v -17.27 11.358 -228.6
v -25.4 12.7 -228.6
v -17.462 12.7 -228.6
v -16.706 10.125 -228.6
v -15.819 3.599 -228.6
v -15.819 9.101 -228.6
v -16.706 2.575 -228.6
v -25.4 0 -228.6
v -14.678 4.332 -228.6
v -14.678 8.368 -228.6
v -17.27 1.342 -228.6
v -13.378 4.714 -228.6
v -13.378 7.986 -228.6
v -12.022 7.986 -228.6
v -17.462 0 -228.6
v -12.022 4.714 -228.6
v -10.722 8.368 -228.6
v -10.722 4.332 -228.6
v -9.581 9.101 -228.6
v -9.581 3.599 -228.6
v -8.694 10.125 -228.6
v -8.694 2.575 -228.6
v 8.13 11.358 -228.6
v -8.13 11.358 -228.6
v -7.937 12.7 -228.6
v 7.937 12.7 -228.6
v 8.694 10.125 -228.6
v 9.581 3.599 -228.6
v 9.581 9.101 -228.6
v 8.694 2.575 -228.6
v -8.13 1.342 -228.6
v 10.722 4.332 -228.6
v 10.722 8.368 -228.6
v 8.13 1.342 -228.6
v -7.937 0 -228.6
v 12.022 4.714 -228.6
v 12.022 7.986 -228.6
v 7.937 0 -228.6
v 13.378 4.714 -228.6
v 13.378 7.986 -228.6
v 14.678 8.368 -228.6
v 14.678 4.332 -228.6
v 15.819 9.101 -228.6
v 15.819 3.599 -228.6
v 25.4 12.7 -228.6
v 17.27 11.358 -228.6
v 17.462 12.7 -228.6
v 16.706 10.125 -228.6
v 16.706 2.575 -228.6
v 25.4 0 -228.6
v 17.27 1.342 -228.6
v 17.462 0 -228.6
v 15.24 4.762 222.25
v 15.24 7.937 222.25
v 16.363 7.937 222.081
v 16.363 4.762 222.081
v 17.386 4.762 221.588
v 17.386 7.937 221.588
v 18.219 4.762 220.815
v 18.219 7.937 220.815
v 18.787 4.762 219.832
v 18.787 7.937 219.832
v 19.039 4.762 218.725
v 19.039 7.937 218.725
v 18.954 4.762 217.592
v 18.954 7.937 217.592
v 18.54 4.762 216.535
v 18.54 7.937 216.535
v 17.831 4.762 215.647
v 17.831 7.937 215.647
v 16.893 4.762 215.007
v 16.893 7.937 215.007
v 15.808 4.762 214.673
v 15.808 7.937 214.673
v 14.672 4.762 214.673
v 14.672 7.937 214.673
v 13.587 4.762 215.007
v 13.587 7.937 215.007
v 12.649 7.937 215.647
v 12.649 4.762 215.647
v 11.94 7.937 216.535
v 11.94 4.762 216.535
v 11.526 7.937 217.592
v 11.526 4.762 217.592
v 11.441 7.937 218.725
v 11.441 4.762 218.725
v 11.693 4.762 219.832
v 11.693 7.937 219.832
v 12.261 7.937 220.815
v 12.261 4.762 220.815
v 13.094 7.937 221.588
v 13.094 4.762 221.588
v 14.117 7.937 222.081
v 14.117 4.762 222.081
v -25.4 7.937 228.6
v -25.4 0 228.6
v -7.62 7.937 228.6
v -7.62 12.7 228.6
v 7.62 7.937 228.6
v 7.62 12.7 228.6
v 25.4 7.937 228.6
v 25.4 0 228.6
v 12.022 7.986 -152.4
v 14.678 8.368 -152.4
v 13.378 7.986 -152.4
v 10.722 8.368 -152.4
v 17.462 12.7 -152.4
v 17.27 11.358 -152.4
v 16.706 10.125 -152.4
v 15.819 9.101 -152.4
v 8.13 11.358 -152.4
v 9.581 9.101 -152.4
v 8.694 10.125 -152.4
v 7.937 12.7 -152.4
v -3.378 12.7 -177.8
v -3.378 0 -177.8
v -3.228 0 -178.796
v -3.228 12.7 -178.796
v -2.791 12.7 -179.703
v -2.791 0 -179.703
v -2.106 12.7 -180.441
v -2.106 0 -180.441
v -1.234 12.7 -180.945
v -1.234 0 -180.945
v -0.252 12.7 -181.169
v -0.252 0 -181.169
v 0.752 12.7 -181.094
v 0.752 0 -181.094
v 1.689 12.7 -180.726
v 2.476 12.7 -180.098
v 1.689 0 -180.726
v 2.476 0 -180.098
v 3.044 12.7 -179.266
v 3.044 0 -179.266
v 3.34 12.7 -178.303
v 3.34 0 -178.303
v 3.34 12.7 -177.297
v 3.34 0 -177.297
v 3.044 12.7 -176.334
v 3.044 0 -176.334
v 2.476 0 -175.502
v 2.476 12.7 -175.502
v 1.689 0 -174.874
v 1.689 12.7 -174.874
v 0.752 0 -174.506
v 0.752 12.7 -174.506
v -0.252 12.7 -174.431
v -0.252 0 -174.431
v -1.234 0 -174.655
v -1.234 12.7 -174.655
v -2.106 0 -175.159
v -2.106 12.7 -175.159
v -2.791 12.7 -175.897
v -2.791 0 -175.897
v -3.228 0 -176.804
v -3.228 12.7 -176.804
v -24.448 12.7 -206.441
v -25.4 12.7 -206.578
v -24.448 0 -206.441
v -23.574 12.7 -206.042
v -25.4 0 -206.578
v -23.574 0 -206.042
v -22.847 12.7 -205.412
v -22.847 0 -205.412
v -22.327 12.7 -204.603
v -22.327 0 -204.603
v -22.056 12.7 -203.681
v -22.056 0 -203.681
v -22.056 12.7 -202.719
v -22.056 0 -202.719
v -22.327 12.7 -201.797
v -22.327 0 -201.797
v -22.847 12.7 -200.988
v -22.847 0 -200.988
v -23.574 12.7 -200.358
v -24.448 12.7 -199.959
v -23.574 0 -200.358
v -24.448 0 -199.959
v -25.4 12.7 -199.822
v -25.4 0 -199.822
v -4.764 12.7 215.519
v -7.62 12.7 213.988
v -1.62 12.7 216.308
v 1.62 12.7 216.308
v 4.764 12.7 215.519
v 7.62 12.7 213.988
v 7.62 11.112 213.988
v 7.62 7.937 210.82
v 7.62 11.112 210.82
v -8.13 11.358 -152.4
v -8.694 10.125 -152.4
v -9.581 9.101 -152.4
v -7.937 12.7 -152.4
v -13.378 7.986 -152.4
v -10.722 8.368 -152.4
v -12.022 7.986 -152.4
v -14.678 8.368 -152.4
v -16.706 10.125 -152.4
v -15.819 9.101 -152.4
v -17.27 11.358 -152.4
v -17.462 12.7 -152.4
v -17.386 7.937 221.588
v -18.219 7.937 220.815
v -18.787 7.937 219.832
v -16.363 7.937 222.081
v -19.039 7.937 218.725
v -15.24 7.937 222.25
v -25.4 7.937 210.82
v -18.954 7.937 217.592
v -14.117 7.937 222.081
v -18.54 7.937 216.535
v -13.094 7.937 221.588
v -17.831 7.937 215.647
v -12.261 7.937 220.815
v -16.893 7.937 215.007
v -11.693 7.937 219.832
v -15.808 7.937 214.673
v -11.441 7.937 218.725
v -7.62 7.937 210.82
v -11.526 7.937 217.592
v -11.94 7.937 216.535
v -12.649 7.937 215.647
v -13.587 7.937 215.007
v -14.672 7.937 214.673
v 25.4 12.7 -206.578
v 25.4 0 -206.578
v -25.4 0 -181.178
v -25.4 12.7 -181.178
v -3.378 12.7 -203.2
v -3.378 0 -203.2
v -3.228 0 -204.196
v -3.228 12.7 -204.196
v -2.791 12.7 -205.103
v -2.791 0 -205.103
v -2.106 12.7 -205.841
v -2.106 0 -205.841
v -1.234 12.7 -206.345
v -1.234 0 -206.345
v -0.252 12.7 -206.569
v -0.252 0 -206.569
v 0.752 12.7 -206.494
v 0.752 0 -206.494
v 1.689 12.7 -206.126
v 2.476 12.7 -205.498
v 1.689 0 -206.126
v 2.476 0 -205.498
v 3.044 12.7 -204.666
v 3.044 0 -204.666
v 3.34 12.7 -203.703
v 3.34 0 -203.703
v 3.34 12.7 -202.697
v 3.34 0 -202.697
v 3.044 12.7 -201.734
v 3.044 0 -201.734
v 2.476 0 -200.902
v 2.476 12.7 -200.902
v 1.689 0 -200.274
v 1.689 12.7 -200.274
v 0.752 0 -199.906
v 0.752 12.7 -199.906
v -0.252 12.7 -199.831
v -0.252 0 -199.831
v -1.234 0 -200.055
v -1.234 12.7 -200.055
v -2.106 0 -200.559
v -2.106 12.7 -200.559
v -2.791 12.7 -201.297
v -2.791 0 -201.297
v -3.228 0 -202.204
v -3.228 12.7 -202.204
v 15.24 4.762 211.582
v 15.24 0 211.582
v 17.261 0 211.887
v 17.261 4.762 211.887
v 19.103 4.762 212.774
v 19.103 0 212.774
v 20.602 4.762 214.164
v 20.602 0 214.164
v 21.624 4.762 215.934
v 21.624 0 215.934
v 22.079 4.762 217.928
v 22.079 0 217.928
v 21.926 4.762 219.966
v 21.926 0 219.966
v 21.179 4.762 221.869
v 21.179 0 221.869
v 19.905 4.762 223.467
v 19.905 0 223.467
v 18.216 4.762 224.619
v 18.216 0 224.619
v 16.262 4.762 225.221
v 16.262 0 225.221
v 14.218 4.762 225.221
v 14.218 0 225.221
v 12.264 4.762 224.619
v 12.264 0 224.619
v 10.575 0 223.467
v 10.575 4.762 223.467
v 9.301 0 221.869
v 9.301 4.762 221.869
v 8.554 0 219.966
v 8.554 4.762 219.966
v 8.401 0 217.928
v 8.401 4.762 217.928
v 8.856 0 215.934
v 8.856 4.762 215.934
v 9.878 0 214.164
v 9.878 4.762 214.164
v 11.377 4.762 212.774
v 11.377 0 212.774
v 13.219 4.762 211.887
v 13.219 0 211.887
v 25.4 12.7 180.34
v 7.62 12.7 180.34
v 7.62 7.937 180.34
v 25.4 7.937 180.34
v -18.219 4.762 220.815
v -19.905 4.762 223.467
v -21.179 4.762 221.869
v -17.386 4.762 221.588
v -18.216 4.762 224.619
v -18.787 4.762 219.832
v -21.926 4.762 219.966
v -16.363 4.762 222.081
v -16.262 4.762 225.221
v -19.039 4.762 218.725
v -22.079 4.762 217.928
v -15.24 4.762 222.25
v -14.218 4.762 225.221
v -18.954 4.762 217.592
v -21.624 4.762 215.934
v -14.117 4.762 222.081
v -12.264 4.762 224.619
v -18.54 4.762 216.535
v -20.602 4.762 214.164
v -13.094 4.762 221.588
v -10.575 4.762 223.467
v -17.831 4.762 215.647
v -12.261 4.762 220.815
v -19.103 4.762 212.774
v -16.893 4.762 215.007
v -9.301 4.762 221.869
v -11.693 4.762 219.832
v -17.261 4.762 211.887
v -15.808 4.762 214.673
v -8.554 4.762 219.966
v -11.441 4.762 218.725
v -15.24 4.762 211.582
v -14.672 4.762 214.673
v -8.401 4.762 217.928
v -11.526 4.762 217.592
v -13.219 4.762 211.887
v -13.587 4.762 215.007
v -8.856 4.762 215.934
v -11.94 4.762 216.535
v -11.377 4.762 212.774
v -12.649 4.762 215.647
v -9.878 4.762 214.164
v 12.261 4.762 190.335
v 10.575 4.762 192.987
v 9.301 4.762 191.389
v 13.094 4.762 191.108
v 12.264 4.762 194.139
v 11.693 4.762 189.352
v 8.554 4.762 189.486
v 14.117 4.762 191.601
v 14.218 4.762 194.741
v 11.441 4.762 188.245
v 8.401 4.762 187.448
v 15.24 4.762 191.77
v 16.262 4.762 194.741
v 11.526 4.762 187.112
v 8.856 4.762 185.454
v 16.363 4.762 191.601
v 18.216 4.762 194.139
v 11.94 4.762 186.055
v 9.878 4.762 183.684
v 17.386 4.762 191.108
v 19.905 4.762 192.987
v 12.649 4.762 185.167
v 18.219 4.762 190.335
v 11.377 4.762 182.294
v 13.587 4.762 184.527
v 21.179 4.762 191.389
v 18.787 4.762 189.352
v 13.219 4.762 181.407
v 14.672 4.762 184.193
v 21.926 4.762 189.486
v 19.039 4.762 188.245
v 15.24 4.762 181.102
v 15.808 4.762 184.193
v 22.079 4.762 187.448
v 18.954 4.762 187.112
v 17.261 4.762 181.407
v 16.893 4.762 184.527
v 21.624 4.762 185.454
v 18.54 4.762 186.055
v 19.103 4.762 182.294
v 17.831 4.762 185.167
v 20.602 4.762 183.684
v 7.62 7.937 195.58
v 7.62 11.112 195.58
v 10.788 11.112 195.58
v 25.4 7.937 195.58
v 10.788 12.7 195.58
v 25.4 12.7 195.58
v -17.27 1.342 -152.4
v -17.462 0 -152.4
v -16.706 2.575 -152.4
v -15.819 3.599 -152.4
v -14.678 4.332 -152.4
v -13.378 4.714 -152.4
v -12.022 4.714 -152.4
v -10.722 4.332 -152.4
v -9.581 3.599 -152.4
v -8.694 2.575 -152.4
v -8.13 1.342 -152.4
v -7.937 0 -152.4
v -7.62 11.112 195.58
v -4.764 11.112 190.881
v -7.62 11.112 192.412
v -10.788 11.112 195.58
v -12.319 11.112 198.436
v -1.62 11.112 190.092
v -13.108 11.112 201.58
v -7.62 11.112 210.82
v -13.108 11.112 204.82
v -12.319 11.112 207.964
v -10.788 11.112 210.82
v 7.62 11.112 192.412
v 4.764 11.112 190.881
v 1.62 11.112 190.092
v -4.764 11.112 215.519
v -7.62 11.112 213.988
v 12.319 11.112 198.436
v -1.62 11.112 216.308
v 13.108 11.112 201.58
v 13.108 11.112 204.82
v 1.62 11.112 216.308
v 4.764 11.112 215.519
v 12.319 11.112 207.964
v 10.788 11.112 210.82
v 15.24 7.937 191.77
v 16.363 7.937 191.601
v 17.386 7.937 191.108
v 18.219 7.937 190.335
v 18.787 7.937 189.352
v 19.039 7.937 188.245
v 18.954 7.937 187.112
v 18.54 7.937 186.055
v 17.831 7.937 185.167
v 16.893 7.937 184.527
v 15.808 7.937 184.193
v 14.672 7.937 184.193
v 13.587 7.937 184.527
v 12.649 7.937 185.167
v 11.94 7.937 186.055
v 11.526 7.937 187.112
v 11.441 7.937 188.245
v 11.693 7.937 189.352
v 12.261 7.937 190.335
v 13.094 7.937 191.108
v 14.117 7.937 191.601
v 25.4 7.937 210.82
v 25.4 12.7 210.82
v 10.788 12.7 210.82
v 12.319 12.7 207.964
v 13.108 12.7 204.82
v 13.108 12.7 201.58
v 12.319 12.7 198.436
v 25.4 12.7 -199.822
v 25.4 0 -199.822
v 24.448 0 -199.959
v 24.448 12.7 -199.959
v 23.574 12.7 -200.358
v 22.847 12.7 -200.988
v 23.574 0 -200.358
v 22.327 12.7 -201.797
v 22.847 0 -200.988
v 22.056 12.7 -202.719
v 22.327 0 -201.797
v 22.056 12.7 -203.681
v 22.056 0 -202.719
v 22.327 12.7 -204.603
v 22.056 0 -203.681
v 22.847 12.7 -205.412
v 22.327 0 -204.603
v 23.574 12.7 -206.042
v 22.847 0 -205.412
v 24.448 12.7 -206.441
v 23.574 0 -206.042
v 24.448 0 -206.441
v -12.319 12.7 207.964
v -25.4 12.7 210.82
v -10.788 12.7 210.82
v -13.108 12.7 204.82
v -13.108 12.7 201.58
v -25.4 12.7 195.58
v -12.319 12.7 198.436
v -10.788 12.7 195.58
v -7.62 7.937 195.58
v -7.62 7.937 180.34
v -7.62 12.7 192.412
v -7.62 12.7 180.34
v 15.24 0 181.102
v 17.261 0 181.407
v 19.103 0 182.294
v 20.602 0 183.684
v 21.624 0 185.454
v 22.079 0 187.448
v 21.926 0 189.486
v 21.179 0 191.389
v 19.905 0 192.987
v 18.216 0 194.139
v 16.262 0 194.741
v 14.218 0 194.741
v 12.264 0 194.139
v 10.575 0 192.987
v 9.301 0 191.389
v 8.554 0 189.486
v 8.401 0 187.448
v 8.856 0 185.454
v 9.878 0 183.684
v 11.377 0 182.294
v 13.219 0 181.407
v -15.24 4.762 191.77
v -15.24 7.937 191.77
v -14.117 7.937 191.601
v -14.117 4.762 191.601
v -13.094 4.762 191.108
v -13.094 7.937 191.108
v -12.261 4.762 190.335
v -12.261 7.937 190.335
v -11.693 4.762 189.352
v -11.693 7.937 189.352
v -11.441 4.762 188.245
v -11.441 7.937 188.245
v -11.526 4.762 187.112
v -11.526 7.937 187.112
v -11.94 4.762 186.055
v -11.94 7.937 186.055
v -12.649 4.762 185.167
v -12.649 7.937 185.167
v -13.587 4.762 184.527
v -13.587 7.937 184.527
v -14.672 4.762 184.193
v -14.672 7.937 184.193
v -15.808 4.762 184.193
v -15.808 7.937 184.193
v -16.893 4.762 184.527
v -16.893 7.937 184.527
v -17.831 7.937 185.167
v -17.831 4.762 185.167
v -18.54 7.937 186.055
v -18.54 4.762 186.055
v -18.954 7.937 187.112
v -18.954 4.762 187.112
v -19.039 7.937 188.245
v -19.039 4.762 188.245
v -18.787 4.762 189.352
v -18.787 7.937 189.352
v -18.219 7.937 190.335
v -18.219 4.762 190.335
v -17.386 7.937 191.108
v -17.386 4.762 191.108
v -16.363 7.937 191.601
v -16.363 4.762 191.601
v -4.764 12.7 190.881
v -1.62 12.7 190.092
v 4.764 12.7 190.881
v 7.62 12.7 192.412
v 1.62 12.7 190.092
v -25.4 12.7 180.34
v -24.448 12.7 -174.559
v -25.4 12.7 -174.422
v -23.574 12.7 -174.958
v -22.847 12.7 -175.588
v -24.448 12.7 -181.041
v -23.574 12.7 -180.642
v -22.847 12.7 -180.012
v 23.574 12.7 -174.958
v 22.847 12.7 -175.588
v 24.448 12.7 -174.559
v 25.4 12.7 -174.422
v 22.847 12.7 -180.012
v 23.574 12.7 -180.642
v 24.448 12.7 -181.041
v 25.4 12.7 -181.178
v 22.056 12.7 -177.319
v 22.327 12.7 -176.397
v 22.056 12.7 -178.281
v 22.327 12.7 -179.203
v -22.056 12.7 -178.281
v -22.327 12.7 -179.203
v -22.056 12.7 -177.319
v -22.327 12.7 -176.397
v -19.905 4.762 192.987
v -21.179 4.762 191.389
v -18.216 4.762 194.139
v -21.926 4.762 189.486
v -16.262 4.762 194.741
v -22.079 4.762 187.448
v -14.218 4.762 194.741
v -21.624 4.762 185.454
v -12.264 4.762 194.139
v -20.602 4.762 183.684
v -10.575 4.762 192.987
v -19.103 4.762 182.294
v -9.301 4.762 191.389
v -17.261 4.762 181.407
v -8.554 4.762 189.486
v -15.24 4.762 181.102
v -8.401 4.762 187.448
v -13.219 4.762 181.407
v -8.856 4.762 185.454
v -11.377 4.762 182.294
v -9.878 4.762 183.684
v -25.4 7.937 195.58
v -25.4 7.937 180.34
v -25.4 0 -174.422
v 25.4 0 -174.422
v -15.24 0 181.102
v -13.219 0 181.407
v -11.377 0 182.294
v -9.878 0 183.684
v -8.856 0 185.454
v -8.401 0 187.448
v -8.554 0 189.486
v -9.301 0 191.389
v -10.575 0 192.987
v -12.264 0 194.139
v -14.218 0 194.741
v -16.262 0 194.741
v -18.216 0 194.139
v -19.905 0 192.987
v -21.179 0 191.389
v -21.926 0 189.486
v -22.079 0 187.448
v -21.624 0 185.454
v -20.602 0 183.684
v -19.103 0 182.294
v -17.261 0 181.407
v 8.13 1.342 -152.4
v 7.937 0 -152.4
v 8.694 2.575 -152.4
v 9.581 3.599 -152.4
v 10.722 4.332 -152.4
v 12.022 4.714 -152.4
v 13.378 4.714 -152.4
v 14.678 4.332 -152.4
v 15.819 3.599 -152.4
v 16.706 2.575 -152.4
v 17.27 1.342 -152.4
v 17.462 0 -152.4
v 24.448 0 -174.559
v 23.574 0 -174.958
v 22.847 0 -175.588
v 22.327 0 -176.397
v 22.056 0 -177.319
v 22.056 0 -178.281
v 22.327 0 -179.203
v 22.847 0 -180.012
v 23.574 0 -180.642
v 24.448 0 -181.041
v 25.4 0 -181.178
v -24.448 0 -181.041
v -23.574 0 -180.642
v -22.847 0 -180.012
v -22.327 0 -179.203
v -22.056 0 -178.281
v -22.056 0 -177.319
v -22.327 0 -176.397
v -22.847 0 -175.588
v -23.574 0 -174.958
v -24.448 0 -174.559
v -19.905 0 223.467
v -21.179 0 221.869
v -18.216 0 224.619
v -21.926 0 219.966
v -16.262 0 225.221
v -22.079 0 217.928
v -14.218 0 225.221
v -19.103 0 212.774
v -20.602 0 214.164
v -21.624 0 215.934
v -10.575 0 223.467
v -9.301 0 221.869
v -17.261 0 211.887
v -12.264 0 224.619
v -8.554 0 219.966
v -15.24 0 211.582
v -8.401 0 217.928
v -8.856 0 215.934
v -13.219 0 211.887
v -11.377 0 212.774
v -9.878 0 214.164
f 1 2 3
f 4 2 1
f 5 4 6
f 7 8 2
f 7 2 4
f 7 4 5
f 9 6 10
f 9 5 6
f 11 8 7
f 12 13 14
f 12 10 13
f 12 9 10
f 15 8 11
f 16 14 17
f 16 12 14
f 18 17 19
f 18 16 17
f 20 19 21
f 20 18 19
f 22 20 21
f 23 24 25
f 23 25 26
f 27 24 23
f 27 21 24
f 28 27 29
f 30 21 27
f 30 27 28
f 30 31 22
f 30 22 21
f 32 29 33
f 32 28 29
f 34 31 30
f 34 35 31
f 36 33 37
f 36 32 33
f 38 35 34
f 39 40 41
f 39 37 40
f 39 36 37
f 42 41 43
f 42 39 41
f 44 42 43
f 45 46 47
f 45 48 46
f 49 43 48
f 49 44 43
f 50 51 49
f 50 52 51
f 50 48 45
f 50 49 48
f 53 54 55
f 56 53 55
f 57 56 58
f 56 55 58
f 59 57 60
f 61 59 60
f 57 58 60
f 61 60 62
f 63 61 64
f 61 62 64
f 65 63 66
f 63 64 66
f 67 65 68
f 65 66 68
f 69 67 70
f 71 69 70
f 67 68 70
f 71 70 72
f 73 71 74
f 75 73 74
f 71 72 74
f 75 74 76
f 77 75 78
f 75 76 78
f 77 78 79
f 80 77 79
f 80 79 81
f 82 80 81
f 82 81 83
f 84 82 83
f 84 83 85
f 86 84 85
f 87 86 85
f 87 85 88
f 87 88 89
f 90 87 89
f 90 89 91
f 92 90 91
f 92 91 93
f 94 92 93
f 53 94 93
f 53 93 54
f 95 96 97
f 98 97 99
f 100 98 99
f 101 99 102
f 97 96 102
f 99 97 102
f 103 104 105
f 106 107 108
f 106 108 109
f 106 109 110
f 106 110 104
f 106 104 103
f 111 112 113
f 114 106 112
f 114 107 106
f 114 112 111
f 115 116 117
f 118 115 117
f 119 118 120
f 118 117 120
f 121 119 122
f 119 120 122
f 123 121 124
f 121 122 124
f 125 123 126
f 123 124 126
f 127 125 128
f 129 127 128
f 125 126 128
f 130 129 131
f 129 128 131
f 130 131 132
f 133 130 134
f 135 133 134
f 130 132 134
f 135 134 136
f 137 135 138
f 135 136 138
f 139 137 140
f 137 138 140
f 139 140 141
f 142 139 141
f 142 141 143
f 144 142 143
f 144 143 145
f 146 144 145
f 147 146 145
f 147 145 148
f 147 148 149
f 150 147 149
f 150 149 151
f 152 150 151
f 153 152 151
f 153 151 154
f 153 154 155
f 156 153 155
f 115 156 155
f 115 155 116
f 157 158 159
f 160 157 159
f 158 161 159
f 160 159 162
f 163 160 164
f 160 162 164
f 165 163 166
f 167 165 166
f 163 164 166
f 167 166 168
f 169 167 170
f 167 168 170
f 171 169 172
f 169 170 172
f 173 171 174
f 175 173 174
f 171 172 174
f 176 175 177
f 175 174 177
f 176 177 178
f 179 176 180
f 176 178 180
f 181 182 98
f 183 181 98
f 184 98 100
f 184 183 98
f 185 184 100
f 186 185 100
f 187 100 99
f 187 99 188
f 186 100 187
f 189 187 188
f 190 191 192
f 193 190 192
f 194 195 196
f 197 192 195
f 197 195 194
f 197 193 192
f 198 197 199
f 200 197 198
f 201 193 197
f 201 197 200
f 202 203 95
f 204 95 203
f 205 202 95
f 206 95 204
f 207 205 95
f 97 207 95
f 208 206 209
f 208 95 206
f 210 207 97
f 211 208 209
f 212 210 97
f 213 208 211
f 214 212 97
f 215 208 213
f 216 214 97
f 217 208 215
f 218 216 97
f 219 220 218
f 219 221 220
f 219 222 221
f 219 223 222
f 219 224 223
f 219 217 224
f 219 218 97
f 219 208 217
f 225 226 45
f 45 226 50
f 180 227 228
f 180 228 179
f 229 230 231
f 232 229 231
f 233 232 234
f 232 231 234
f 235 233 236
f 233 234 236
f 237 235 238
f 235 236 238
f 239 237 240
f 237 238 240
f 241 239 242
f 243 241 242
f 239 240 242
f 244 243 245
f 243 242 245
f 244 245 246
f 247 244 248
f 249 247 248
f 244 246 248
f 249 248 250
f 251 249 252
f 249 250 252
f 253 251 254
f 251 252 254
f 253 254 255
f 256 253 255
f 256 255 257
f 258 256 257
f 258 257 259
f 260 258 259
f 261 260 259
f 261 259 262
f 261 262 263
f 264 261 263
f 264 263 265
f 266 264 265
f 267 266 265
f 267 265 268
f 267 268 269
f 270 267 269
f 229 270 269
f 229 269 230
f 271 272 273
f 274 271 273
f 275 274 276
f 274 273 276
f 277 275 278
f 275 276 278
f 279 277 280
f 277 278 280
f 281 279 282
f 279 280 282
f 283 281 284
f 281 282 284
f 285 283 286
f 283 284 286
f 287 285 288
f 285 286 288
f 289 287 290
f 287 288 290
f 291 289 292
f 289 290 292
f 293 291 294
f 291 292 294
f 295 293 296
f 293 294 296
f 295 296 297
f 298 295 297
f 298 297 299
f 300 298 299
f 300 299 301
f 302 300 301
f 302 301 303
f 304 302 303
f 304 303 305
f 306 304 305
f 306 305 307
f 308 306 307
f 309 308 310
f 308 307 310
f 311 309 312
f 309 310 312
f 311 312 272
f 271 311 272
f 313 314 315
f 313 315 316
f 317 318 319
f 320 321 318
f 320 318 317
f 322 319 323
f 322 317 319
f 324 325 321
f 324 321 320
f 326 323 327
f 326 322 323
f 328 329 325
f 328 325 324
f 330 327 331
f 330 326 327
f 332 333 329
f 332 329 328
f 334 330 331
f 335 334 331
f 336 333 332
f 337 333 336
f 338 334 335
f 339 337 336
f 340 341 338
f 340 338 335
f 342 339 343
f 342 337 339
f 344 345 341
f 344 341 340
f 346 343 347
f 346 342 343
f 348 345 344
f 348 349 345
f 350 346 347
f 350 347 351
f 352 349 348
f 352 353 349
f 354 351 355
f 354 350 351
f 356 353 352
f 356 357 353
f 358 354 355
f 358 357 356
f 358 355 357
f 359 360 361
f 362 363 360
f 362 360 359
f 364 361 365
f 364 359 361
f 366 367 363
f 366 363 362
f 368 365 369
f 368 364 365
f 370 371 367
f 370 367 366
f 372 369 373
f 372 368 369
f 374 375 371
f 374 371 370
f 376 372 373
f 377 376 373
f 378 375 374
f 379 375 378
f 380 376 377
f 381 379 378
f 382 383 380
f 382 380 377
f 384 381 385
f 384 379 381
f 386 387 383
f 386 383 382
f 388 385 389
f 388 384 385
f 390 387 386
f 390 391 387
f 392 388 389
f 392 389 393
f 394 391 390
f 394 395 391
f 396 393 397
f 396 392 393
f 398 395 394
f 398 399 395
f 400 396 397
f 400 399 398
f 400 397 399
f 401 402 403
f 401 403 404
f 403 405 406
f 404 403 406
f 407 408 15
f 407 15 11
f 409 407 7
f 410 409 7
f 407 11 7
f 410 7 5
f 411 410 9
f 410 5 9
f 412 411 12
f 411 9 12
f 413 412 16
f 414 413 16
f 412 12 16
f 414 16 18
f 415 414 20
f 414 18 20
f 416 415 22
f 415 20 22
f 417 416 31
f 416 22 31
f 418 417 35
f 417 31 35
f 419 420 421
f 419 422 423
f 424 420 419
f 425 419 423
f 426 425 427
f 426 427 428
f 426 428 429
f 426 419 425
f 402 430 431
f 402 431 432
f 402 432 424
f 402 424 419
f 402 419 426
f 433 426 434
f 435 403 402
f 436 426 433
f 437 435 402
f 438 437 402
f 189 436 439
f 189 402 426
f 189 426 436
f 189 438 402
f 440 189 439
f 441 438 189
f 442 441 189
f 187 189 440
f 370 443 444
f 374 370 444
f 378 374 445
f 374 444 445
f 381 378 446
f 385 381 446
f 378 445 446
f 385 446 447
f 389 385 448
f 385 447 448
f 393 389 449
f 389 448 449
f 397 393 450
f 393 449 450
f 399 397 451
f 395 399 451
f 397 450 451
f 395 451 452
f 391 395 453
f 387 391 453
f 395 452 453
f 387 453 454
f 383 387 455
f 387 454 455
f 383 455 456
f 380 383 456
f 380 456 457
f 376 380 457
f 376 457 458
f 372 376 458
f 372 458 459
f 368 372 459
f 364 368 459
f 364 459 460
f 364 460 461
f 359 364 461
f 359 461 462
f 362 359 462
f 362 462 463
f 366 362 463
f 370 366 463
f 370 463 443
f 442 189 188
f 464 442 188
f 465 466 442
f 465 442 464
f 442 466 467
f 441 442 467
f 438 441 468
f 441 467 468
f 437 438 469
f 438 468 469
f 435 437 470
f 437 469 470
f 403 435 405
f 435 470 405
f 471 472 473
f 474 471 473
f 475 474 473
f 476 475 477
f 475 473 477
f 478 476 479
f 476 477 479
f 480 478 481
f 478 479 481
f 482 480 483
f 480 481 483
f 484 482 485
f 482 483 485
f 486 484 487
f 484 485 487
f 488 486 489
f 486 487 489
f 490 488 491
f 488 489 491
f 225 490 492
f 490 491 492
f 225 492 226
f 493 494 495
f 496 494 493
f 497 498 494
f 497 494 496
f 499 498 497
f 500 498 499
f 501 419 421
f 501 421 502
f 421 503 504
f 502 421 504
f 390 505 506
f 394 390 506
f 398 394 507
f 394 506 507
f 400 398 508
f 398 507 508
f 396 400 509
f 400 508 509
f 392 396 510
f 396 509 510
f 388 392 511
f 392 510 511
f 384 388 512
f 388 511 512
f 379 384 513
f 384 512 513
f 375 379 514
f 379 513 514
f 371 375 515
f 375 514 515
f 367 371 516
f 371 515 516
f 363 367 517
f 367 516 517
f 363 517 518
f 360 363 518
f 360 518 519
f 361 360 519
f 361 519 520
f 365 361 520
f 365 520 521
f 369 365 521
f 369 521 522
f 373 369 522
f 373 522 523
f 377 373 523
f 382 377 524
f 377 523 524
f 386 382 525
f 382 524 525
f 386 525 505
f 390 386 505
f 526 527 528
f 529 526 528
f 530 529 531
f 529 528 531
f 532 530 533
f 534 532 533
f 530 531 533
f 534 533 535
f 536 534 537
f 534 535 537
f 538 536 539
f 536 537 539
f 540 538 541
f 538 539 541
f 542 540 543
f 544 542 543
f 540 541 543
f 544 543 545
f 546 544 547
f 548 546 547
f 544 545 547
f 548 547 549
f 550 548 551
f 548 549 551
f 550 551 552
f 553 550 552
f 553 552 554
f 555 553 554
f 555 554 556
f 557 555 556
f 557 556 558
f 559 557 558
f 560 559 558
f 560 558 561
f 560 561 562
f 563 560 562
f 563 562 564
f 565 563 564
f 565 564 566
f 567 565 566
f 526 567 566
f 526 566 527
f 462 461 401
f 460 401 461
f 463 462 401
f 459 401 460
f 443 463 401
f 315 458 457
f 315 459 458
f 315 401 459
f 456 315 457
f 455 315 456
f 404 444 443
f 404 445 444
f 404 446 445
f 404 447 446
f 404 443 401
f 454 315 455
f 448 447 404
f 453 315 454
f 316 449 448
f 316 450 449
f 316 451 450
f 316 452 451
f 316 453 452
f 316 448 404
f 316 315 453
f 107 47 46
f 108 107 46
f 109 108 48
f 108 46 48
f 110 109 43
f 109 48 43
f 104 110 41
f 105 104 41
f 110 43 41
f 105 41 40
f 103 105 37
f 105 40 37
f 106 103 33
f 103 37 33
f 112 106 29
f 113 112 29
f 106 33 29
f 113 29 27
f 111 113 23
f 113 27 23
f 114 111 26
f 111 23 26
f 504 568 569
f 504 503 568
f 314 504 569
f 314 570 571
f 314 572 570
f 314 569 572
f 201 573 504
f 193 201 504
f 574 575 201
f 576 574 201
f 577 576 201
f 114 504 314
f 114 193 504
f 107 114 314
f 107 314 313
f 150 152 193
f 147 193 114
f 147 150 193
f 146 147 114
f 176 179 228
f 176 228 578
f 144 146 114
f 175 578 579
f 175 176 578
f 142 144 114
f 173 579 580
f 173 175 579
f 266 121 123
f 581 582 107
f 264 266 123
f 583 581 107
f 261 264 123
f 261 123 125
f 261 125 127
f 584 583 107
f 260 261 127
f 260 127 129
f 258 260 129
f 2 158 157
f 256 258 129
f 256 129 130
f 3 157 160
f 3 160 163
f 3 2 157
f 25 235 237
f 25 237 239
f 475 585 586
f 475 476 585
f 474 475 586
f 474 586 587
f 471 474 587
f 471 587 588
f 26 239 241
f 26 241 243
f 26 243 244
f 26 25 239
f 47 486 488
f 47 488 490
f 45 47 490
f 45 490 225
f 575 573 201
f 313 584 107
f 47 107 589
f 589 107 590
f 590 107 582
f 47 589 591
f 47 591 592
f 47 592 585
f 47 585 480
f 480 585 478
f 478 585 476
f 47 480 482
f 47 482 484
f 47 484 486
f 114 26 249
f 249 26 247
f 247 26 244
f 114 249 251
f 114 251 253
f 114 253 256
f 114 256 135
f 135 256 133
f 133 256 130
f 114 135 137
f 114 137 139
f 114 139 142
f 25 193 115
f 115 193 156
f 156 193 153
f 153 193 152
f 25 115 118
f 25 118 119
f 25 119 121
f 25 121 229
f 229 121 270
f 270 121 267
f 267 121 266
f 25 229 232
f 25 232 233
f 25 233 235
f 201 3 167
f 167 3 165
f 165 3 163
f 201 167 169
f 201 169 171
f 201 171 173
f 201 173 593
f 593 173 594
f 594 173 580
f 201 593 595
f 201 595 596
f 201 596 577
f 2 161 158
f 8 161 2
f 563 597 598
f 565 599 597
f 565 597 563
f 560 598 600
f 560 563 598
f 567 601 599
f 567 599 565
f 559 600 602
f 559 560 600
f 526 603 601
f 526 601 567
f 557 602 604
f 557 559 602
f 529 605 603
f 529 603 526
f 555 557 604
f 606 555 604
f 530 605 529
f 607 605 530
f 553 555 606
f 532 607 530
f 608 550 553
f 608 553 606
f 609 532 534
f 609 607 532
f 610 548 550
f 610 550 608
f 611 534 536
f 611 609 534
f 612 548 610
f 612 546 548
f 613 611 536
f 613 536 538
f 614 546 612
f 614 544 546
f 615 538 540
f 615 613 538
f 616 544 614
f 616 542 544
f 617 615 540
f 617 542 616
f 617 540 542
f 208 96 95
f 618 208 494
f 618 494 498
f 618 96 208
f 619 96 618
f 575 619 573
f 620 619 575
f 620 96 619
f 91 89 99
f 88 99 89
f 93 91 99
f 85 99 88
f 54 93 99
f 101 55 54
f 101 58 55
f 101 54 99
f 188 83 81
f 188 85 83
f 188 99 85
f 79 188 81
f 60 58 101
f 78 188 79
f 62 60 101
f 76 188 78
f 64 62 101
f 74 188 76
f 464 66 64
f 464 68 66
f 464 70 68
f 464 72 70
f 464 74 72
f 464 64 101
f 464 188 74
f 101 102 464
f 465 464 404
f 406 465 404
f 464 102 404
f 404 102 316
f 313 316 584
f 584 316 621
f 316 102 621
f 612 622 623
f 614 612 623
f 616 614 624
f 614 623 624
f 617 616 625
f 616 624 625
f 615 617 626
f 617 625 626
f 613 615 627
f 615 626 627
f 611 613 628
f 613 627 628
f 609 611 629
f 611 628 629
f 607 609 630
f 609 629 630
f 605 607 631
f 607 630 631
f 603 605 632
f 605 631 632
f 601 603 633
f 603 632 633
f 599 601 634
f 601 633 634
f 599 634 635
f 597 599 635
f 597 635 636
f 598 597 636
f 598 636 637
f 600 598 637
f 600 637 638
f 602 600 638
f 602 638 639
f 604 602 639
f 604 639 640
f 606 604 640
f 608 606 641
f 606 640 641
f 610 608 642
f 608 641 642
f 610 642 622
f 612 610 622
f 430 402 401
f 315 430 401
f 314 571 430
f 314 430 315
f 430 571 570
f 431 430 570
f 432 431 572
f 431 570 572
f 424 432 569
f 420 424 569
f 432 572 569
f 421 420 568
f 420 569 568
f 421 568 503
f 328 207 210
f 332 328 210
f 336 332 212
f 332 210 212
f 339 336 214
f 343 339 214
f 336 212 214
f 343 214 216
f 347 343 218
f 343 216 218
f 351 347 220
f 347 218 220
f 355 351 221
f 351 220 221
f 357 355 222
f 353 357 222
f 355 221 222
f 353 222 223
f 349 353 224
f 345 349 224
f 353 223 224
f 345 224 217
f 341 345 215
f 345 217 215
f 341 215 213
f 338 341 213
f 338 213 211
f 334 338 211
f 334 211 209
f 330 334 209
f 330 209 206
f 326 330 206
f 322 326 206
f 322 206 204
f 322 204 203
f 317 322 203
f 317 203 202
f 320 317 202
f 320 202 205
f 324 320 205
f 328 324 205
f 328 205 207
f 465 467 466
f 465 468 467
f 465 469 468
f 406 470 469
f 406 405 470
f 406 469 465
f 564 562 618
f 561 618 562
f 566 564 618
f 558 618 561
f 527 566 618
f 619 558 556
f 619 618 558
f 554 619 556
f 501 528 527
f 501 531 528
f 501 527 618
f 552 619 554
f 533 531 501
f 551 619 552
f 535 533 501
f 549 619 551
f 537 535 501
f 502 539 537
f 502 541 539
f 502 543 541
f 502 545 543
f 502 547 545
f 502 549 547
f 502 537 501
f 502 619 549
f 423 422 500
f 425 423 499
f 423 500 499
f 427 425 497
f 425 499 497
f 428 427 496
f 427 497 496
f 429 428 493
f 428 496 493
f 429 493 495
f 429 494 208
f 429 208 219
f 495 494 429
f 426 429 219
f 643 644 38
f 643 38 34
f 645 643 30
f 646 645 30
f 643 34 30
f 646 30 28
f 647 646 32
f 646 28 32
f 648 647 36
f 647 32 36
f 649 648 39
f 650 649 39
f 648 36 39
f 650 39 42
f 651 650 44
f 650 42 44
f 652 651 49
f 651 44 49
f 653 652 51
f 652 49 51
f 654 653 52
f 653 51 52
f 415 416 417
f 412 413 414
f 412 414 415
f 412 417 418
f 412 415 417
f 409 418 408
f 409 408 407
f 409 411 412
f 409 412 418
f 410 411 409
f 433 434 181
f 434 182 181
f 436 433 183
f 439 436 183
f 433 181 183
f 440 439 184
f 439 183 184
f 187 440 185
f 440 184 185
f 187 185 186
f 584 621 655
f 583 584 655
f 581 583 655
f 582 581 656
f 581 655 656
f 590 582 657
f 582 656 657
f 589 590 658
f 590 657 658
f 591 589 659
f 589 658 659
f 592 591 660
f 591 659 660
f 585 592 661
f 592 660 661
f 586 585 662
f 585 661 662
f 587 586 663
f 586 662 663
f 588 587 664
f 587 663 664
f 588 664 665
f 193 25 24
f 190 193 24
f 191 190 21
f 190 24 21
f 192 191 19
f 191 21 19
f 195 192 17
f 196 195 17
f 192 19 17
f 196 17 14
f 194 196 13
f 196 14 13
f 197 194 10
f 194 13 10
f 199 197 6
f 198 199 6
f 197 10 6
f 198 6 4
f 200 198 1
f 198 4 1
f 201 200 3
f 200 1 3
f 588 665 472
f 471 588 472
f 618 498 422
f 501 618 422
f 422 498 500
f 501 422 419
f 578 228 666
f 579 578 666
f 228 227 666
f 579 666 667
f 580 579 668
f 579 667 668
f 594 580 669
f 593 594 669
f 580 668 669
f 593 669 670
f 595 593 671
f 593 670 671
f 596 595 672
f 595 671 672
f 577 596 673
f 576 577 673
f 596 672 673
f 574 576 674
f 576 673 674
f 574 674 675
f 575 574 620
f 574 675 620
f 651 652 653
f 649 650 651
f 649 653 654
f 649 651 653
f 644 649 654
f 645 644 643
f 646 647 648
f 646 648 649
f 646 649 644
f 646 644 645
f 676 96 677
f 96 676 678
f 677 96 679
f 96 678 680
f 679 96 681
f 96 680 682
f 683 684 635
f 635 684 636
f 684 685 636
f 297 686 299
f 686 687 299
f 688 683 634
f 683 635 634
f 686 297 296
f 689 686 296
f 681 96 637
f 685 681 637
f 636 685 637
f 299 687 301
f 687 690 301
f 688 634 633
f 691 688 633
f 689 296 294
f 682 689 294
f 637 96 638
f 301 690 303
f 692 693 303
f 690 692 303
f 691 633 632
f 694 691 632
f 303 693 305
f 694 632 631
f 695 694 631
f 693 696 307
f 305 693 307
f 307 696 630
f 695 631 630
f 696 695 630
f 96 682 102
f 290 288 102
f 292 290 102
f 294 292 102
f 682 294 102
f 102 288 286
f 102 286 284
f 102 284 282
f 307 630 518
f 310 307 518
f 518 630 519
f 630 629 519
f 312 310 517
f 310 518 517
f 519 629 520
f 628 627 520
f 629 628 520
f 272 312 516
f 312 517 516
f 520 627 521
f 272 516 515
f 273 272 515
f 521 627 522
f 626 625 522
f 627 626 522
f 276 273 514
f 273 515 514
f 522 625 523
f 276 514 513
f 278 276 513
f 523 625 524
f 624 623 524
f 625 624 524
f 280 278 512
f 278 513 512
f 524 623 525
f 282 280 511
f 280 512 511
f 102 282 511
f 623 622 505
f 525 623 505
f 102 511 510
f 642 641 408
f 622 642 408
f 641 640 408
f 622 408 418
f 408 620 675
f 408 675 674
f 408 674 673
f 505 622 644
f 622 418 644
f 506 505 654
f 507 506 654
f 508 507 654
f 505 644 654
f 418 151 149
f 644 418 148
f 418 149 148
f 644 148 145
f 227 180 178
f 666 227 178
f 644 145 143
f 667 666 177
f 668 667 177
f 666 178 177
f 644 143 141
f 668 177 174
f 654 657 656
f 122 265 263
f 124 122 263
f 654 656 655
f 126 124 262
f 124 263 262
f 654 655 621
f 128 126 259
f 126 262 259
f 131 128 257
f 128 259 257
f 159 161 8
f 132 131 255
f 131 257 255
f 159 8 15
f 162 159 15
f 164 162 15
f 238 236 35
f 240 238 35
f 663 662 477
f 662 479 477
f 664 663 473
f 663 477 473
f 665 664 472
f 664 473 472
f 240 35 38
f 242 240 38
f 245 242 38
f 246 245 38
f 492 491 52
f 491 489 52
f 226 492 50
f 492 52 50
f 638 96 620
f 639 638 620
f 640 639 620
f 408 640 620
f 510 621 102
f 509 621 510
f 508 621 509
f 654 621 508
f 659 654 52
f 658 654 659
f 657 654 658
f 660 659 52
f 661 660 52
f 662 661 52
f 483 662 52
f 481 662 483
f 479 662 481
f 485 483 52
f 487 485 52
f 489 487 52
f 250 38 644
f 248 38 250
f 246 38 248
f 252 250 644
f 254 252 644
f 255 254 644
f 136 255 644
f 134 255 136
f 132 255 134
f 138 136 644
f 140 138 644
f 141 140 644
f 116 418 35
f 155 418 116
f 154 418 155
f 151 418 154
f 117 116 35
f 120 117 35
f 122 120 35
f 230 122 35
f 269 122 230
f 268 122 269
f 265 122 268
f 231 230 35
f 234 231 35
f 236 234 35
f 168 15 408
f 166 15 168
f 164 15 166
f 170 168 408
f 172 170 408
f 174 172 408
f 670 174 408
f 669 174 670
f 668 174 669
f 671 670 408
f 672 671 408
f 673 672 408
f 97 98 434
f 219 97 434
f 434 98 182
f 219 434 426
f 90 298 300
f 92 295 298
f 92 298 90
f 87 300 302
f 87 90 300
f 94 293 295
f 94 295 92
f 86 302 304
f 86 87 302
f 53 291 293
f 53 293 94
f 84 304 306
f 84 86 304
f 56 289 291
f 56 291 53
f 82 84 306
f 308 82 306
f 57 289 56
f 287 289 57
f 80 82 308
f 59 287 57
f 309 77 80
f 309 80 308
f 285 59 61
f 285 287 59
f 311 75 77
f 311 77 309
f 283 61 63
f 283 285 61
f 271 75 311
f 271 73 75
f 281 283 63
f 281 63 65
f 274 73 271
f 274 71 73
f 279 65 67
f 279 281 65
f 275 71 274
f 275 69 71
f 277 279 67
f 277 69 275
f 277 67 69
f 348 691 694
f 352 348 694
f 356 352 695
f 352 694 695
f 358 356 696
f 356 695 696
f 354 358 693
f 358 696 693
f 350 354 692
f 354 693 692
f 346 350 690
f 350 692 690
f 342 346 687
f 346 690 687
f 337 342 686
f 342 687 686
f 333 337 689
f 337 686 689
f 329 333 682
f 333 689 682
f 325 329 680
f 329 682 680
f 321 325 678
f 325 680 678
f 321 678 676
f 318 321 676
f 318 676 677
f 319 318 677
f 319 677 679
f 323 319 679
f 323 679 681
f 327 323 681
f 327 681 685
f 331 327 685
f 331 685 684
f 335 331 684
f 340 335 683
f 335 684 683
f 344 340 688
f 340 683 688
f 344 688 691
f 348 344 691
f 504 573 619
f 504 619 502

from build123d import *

# Parameters (mm, degrees)
SKETCH1_W               = 50.8
SKETCH1_H               = 457.2
BOSS_EXTRUDE1_DEPTH     = 12.7
SKETCH2_R               = 4.7625
CUT_EXTRUDE1_DEPTH      = 76.2
F_1_4_CLEARANCE_HOLE1_D = 6.7564
SKETCH11_R              = 13.208
CUT_EXTRUDE2_DEPTH      = 1.5875
SKETCH13_R              = 3.81
CUT_EXTRUDE3_DEPTH      = 231.35713577
SKETCH15_W              = 17.78
SKETCH15_H              = 15.24
SKETCH15_H_2            = 17.78
CUT_EXTRUDE4_DEPTH      = 4.7625
SKETCH16_R              = 6.858
CUT_EXTRUDE5_DEPTH      = 4.7625


with BuildPart() as part:
    # Sketch1 → Boss-Extrude1 (new body)
    with BuildSketch(Plane(origin=(0, 0, 0), x_dir=(1, 0, 0), z_dir=(0, 1, 0))):
        Rectangle(SKETCH1_W, SKETCH1_H)
    extrude(amount=BOSS_EXTRUDE1_DEPTH)

    # Sketch2 → Cut-Extrude1 (cut)
    with BuildSketch(Plane(origin=(0, 0, -228.6), x_dir=(-1, 0, 0), z_dir=(0, 0, -1))):
        with Locations((-12.7, 12.7)):
            Circle(SKETCH2_R)
        with Locations((12.7, 12.7)):
            Circle(SKETCH2_R)
        with Locations((-12.7, 0)):
            Circle(SKETCH2_R)
        with Locations((12.7, 0)):
            Circle(SKETCH2_R)
    extrude(amount=-CUT_EXTRUDE1_DEPTH, mode=Mode.SUBTRACT)

    # 1/4 Clearance Hole1 (through all)
    with Locations(Plane(origin=(0, 12.7, 0), x_dir=(1, 0, 0), z_dir=(0, 1, 0))):
        with Locations((0, 203.2), (0, 177.8), (25.4, 203.2), (25.4, 177.8), (-25.4, 177.8), (-25.4, 203.2)):
            Hole(F_1_4_CLEARANCE_HOLE1_D / 2)

    # Sketch11 → Cut-Extrude2 (cut)
    with BuildSketch(Plane(origin=(0, 12.7, 0), x_dir=(1, 0, 0), z_dir=(0, 1, 0))):
        with Locations(Location((0, -203.2, 0), (0, 0, 270))):
            Circle(SKETCH11_R)
    extrude(amount=-CUT_EXTRUDE2_DEPTH, mode=Mode.SUBTRACT)

    # Sketch13 → Cut-Extrude3 (cut, through all)
    with BuildSketch(Plane(origin=(0, 12.7, 0), x_dir=(1, 0, 0), z_dir=(0, 1, 0))):
        with Locations(Location((-15.24, -187.96, 0), (0, 0, 270))):
            Circle(SKETCH13_R)
        with Locations(Location((15.24, -187.96, 0), (0, 0, 270))):
            Circle(SKETCH13_R)
        with Locations(Location((15.24, -218.44, 0), (0, 0, 270))):
            Circle(SKETCH13_R)
        with Locations(Location((-15.24, -218.44, 0), (0, 0, 270))):
            Circle(SKETCH13_R)
    extrude(amount=-CUT_EXTRUDE3_DEPTH, mode=Mode.SUBTRACT)

    # Sketch15 → Cut-Extrude4 (cut)
    with BuildSketch(Plane(origin=(0, 12.7, 0), x_dir=(1, 0, 0), z_dir=(0, 1, 0))):
        with Locations((-16.51, -187.96)):
            Rectangle(SKETCH15_W, SKETCH15_H)
        with Locations((16.51, -187.96)):
            Rectangle(SKETCH15_W, SKETCH15_H)
        with Locations((-16.51, -219.71)):
            Rectangle(SKETCH15_W, SKETCH15_H_2)
        with Locations((16.51, -219.71)):
            Rectangle(SKETCH15_W, SKETCH15_H_2)
    extrude(amount=-CUT_EXTRUDE4_DEPTH, mode=Mode.SUBTRACT)

    # Sketch16 → Cut-Extrude5 (cut)
    with BuildSketch(Plane.XZ):
        with Locations(Location((-15.24, 218.44, 0), (0, 0, 270))):
            Circle(SKETCH16_R)
        with Locations(Location((15.24, 218.44, 0), (0, 0, 270))):
            Circle(SKETCH16_R)
        with Locations(Location((15.24, 187.96, 0), (0, 0, 270))):
            Circle(SKETCH16_R)
        with Locations(Location((-15.24, 187.96, 0), (0, 0, 270))):
            Circle(SKETCH16_R)
    extrude(amount=-CUT_EXTRUDE5_DEPTH, mode=Mode.SUBTRACT)


solid = part.part
